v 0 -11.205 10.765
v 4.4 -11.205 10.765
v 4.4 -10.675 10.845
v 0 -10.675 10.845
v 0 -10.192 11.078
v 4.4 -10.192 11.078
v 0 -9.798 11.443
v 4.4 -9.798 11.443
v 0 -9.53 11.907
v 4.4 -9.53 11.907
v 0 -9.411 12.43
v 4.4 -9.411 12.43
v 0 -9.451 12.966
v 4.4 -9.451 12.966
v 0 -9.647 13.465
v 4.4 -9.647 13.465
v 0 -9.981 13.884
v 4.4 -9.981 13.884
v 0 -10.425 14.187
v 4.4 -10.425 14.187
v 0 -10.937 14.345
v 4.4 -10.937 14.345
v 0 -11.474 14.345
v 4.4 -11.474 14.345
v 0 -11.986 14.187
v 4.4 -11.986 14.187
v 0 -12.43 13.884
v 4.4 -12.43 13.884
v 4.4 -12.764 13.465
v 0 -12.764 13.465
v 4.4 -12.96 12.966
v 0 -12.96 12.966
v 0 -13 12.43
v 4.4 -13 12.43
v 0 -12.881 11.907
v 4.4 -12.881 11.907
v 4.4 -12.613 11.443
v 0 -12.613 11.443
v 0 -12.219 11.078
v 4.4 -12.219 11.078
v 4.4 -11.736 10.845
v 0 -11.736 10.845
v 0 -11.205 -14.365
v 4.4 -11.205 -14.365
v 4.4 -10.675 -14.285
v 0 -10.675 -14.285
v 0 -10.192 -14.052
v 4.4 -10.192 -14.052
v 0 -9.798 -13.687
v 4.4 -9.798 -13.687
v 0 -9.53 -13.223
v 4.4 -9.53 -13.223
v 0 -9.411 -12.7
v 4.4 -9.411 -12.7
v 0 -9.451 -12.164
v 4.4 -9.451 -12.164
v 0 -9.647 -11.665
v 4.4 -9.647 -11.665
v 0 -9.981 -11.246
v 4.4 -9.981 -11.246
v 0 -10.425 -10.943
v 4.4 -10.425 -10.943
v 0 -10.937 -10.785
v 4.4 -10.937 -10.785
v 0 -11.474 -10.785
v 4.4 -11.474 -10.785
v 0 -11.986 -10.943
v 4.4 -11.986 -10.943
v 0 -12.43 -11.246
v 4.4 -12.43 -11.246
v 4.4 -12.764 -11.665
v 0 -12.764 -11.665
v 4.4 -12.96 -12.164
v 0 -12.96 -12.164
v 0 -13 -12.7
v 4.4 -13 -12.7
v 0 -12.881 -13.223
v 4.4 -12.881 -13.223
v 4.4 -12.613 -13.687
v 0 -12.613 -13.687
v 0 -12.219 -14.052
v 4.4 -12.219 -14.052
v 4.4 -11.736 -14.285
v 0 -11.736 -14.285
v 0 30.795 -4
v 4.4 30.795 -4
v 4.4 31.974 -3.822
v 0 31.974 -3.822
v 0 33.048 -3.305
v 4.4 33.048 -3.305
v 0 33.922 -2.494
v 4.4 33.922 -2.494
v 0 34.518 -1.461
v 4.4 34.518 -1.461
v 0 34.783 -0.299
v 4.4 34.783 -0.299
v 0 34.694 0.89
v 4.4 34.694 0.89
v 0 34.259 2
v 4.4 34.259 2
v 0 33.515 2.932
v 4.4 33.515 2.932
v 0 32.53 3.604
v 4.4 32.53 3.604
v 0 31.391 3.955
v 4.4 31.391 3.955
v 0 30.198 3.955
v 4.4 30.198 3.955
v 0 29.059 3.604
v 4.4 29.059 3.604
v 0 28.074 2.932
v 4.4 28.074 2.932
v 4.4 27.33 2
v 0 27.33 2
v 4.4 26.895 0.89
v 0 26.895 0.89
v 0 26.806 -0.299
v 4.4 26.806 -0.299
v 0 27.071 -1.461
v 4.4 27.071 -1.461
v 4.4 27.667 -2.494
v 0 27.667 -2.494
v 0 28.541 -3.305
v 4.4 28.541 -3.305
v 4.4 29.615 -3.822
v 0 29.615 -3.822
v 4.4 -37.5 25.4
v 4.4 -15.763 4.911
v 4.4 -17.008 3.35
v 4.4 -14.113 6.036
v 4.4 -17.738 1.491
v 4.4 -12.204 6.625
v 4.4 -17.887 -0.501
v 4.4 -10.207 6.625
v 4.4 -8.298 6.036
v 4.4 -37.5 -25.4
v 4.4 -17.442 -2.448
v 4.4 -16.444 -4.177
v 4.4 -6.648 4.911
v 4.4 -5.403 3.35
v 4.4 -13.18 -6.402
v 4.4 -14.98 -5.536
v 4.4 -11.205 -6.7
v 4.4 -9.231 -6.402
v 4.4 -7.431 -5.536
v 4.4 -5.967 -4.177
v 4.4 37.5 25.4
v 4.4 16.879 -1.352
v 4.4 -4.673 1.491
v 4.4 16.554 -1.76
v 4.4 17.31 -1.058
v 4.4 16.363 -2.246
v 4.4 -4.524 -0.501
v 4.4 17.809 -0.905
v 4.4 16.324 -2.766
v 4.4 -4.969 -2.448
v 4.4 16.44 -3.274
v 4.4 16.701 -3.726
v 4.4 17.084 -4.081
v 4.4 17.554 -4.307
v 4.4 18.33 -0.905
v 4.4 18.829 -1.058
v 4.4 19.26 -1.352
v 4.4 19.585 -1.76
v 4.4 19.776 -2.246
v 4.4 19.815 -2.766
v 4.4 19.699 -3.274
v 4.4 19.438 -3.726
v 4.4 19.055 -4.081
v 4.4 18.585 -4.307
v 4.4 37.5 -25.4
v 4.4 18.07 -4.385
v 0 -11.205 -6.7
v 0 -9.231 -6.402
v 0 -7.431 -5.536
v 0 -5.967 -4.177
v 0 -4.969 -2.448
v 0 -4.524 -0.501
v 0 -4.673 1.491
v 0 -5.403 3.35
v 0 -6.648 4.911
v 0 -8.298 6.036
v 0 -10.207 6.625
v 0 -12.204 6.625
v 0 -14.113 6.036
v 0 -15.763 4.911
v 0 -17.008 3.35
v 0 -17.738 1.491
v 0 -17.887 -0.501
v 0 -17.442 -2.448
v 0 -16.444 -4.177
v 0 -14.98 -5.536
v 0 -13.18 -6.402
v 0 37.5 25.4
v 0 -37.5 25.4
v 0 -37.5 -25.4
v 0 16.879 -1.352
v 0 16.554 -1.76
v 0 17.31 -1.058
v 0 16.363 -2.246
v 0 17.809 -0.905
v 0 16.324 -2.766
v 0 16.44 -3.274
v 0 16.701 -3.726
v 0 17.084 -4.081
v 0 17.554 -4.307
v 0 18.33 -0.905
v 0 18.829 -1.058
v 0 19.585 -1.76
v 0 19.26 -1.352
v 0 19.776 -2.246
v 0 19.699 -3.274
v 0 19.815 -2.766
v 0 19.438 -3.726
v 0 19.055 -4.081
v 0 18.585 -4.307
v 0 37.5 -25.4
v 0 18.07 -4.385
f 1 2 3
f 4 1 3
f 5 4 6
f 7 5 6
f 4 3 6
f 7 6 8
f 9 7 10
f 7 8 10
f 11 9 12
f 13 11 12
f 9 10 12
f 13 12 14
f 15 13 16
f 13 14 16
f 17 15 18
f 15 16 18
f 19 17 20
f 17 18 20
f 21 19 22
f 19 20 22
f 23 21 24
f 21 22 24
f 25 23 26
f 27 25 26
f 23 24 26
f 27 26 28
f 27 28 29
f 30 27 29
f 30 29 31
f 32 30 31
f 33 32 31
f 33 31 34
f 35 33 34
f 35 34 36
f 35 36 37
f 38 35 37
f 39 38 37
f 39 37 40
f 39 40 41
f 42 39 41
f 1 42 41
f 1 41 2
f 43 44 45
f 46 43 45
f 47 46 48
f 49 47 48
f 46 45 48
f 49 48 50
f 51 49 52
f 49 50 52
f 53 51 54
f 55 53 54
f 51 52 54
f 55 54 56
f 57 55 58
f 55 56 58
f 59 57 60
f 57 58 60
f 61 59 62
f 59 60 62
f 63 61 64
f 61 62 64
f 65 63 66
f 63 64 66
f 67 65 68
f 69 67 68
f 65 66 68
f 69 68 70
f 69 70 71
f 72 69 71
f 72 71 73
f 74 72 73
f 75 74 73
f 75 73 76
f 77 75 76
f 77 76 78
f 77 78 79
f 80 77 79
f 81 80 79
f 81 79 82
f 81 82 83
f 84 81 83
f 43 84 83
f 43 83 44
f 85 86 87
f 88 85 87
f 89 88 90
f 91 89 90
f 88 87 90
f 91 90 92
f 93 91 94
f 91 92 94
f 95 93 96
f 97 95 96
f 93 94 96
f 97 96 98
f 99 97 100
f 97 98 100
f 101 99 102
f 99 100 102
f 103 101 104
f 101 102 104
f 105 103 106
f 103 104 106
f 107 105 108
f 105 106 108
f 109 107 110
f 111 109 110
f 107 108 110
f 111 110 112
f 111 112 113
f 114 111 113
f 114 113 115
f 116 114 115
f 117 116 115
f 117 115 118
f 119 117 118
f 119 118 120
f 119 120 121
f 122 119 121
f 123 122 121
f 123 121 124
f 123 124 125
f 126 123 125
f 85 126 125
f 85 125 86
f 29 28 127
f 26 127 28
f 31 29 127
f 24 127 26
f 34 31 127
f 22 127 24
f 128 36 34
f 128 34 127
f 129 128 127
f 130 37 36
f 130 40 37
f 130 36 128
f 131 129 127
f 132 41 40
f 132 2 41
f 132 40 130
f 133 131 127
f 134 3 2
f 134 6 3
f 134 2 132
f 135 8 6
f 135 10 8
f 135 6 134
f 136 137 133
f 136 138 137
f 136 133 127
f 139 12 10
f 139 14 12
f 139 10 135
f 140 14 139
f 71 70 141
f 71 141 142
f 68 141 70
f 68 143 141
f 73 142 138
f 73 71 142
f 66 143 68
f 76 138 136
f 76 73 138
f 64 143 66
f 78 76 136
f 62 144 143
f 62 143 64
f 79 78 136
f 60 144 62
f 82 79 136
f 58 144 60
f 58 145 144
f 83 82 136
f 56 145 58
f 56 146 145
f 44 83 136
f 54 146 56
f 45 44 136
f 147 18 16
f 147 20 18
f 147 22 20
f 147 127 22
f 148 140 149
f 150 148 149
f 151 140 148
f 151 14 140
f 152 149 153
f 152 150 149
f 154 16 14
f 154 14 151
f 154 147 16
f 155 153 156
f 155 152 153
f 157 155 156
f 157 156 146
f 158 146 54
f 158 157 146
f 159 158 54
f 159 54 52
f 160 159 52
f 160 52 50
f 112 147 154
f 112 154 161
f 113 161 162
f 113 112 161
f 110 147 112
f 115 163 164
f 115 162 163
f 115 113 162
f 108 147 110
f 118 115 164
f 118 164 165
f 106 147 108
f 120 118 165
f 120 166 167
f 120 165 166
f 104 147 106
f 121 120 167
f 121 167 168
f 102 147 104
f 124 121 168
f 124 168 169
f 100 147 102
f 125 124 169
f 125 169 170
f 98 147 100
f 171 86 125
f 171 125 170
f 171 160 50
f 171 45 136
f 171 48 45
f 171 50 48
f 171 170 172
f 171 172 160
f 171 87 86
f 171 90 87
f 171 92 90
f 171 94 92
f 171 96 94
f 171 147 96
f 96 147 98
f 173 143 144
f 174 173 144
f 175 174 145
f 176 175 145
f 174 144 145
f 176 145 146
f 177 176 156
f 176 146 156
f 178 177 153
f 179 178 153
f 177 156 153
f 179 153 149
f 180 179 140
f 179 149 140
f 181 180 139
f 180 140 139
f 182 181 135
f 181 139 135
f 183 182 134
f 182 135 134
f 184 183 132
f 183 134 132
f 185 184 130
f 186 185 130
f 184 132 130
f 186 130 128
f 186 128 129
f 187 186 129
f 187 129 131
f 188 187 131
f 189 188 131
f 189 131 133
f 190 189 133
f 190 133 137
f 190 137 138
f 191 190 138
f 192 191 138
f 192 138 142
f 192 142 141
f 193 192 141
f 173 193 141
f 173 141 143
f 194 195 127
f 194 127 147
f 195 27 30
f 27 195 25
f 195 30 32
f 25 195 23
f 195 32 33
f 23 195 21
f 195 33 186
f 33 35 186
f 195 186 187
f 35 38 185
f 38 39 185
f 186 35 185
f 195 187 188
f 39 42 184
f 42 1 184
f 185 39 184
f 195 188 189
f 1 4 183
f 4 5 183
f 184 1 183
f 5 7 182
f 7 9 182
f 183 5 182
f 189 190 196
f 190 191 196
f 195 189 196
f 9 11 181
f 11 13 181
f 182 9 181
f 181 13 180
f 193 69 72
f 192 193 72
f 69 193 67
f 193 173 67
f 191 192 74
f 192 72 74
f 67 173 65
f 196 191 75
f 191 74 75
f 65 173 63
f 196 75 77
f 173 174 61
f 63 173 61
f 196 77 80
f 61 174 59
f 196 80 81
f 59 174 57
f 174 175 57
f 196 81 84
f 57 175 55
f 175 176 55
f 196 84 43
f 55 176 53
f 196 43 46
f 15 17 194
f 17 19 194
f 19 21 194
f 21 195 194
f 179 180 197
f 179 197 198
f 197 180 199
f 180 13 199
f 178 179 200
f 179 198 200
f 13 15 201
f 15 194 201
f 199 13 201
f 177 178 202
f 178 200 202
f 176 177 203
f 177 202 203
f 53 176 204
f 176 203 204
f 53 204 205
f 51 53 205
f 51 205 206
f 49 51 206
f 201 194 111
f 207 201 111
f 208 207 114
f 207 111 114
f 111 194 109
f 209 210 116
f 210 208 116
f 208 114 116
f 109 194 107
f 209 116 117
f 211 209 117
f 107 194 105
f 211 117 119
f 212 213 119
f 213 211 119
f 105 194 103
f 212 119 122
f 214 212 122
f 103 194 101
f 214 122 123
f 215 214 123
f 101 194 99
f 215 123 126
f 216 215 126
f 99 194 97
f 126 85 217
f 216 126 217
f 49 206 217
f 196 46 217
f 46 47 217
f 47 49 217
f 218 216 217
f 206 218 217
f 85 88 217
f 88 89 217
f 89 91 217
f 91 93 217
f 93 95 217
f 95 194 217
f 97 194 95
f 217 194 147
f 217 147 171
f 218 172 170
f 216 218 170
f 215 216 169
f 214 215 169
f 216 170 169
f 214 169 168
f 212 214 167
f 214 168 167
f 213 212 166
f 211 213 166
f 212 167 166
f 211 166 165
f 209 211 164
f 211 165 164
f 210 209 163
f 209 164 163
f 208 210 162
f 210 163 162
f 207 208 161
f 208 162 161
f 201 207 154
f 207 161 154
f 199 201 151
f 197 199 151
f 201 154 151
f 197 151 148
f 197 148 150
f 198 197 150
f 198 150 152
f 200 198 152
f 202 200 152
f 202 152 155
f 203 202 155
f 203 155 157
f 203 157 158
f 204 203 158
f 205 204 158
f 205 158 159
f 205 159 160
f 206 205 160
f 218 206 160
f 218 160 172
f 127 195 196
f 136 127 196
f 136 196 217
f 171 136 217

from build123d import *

# Parameters (mm, degrees)
SKETCH1_W           = 50.8
SKETCH1_H           = 75
BOSS_EXTRUDE1_DEPTH = 4.4
SKETCH2_R           = 4
SKETCH2_R_2         = 6.7
SKETCH2_R_3         = 1.8
CUT_EXTRUDE1_DEPTH  = 46.505713927
SKETCH4_R           = 1.75
CUT_EXTRUDE2_DEPTH  = 46.505713927


with BuildPart() as part:
    # Sketch1 → Boss-Extrude1 (new body)
    with BuildSketch(Plane(origin=(0, 0, 0), x_dir=(0, 0, -1), z_dir=(1, 0, 0))):
        Rectangle(SKETCH1_W, SKETCH1_H)
    extrude(amount=BOSS_EXTRUDE1_DEPTH)

    # Sketch2 → Cut-Extrude1 (cut, through all)
    with BuildSketch(Plane(origin=(4.4, 0, 0), x_dir=(0, 0, -1), z_dir=(1, 0, 0))):
        with Locations((0, 30.794503628)):
            Circle(SKETCH2_R)
        with Locations((0, -11.205496372)):
            Circle(SKETCH2_R_2)
        with Locations((-12.565, -11.205496372)):
            Circle(SKETCH2_R_3)
        with Locations((12.565, -11.205496372)):
            Circle(SKETCH2_R_3)
    extrude(amount=-CUT_EXTRUDE1_DEPTH, mode=Mode.SUBTRACT)

    # Sketch4 → Cut-Extrude2 (cut, through all)
    with BuildSketch(Plane(origin=(4.4, 0, 0), x_dir=(0, 0, -1), z_dir=(1, 0, 0))):
        with Locations((2.63504704, 18.069503628)):
            Circle(SKETCH4_R)
    extrude(amount=-CUT_EXTRUDE2_DEPTH, mode=Mode.SUBTRACT)


solid = part.part
